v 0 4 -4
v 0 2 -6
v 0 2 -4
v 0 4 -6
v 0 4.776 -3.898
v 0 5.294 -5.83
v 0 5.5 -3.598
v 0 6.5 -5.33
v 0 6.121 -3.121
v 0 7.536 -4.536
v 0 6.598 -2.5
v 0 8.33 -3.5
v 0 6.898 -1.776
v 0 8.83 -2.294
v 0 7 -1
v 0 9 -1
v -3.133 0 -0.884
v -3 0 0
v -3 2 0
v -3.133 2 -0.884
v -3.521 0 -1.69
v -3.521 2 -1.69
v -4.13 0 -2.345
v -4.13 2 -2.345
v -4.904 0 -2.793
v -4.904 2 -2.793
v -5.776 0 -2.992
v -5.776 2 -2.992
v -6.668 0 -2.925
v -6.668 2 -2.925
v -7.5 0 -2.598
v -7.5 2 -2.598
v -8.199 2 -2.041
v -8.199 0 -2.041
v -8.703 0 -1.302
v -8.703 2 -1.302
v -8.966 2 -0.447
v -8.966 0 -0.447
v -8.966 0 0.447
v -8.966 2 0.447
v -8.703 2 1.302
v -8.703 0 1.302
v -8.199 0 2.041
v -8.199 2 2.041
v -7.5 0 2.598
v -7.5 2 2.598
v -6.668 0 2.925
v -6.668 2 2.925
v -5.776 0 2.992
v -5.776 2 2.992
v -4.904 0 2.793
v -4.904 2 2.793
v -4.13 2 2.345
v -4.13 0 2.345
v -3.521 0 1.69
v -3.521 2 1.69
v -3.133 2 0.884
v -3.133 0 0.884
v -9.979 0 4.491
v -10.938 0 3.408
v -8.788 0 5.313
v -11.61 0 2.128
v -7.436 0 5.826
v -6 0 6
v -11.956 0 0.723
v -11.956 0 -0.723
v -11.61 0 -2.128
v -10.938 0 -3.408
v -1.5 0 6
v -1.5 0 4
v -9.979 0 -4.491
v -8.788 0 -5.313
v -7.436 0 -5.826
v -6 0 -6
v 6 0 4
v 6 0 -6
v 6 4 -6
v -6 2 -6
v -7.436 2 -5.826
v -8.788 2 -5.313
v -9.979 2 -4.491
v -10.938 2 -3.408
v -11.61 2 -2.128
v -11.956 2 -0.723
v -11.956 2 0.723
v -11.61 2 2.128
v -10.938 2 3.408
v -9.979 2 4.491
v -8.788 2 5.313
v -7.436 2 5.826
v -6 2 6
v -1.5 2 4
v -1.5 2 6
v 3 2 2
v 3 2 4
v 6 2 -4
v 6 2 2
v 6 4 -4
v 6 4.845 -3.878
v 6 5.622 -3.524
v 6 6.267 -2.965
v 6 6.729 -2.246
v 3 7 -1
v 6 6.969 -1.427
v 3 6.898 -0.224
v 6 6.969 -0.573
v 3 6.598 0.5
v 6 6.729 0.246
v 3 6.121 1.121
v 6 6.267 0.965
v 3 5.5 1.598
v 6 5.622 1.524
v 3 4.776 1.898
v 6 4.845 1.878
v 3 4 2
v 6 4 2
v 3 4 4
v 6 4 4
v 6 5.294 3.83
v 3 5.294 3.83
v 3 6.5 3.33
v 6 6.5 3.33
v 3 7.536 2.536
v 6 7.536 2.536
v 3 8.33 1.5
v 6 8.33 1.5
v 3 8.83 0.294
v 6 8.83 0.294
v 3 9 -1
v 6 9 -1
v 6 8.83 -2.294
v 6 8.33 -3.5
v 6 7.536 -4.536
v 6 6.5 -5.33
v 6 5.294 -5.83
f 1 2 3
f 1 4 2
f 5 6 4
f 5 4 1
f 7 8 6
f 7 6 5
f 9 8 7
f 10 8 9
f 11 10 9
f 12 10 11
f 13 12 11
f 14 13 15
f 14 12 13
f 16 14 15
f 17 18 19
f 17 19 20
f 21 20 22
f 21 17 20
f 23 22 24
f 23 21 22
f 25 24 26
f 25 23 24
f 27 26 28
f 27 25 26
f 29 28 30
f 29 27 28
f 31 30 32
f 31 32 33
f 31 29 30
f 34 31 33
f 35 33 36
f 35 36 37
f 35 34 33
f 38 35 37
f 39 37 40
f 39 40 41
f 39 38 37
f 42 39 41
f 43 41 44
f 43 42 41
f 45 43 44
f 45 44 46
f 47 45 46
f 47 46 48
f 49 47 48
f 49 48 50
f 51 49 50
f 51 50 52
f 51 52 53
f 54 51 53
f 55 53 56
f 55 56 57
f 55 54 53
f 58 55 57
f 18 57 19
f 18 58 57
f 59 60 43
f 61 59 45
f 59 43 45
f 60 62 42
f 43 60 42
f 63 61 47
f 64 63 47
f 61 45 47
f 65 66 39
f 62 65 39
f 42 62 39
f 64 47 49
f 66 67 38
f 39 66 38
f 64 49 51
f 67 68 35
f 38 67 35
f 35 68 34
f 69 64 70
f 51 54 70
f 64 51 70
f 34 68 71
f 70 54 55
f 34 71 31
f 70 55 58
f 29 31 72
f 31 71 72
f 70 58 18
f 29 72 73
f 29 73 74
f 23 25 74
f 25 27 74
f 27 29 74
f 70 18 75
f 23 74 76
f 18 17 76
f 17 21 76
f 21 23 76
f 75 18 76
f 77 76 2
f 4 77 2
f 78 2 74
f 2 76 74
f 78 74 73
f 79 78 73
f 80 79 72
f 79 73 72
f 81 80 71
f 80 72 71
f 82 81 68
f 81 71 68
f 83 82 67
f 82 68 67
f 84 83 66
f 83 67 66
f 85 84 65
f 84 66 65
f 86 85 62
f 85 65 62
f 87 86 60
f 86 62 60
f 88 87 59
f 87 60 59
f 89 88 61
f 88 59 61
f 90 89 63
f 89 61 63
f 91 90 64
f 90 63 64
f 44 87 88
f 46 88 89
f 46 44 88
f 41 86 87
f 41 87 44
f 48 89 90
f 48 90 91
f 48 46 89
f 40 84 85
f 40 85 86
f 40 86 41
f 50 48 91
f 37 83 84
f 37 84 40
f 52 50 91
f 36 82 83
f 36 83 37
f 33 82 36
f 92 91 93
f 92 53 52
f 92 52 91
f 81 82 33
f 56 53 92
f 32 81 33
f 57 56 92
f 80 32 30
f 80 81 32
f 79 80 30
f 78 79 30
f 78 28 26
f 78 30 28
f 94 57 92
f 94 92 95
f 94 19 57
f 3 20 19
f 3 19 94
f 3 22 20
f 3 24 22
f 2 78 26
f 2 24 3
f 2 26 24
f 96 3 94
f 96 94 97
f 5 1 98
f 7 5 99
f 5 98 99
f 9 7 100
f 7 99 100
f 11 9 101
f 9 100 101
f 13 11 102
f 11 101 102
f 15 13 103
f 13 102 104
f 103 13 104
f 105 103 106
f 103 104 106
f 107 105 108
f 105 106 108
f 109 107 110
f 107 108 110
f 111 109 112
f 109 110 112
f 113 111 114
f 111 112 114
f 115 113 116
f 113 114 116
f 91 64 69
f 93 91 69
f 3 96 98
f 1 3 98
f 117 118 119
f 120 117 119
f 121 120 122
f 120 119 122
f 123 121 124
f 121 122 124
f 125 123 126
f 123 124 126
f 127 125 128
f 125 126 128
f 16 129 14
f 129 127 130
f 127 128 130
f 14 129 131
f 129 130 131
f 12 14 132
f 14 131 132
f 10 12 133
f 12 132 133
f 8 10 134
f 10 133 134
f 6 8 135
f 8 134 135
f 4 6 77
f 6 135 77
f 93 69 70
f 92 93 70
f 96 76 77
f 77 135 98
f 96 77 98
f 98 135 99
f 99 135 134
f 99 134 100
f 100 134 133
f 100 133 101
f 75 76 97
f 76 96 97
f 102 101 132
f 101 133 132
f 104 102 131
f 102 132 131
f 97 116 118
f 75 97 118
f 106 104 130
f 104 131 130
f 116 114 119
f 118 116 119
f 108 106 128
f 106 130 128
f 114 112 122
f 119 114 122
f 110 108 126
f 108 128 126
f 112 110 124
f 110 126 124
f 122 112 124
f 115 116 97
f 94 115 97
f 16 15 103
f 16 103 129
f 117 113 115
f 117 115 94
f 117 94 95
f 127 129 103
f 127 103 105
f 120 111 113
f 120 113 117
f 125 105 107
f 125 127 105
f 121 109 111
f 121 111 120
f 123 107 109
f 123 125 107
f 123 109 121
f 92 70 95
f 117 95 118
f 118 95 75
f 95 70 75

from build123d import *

# Parameters (mm, degrees)
SKETCH1_R           = 3
BOSS_EXTRUDE1_DEPTH = 2
BOSS_EXTRUDE2_DEPTH = 6
SKETCH3_W           = 5
SKETCH3_H           = 7
CUT_EXTRUDE1_DEPTH  = 3


with BuildPart() as part:
    # Sketch1 → Boss-Extrude1 (new body)
    with BuildSketch(Plane(origin=(0, 0, 0), x_dir=(1, 0, 0), z_dir=(0, 1, 0))):
        with BuildLine():
            Line((6, 6), (-6, 6))
            ThreePointArc((-6, 6), (-12, 0), (-6, -6))
            Line((-6, -6), (-1.5, -6))
            Line((-1.5, -6), (-1.5, -4))
            Line((-1.5, -4), (6, -4))
            Line((6, -4), (6, 6))
        make_face()
        with Locations((-6, 0)):
            Circle(SKETCH1_R, mode=Mode.SUBTRACT)
    extrude(amount=BOSS_EXTRUDE1_DEPTH)

    # Sketch2 → Boss-Extrude2 (add)
    with BuildSketch(Plane(origin=(6, 0, 0), x_dir=(0, 0, -1), z_dir=(1, 0, 0))):
        with BuildLine():
            Line((4, 2), (4, 4))
            ThreePointArc((4, 4), (1, 7), (-2, 4))
            Line((-2, 4), (-2, 2))
            Line((-2, 2), (-4, 2))
            Line((-4, 2), (-4, 4))
            ThreePointArc((-4, 4), (1, 9), (6, 4))
            Line((6, 4), (6, 2))
            Line((6, 2), (4, 2))
        make_face()
    extrude(amount=-BOSS_EXTRUDE2_DEPTH)

    # Sketch3 → Cut-Extrude1 (cut)
    with BuildSketch(Plane.ZY):
        with Locations((1.5, 5.5)):
            Rectangle(SKETCH3_W, SKETCH3_H)
    extrude(amount=-CUT_EXTRUDE1_DEPTH, mode=Mode.SUBTRACT)


solid = part.part
